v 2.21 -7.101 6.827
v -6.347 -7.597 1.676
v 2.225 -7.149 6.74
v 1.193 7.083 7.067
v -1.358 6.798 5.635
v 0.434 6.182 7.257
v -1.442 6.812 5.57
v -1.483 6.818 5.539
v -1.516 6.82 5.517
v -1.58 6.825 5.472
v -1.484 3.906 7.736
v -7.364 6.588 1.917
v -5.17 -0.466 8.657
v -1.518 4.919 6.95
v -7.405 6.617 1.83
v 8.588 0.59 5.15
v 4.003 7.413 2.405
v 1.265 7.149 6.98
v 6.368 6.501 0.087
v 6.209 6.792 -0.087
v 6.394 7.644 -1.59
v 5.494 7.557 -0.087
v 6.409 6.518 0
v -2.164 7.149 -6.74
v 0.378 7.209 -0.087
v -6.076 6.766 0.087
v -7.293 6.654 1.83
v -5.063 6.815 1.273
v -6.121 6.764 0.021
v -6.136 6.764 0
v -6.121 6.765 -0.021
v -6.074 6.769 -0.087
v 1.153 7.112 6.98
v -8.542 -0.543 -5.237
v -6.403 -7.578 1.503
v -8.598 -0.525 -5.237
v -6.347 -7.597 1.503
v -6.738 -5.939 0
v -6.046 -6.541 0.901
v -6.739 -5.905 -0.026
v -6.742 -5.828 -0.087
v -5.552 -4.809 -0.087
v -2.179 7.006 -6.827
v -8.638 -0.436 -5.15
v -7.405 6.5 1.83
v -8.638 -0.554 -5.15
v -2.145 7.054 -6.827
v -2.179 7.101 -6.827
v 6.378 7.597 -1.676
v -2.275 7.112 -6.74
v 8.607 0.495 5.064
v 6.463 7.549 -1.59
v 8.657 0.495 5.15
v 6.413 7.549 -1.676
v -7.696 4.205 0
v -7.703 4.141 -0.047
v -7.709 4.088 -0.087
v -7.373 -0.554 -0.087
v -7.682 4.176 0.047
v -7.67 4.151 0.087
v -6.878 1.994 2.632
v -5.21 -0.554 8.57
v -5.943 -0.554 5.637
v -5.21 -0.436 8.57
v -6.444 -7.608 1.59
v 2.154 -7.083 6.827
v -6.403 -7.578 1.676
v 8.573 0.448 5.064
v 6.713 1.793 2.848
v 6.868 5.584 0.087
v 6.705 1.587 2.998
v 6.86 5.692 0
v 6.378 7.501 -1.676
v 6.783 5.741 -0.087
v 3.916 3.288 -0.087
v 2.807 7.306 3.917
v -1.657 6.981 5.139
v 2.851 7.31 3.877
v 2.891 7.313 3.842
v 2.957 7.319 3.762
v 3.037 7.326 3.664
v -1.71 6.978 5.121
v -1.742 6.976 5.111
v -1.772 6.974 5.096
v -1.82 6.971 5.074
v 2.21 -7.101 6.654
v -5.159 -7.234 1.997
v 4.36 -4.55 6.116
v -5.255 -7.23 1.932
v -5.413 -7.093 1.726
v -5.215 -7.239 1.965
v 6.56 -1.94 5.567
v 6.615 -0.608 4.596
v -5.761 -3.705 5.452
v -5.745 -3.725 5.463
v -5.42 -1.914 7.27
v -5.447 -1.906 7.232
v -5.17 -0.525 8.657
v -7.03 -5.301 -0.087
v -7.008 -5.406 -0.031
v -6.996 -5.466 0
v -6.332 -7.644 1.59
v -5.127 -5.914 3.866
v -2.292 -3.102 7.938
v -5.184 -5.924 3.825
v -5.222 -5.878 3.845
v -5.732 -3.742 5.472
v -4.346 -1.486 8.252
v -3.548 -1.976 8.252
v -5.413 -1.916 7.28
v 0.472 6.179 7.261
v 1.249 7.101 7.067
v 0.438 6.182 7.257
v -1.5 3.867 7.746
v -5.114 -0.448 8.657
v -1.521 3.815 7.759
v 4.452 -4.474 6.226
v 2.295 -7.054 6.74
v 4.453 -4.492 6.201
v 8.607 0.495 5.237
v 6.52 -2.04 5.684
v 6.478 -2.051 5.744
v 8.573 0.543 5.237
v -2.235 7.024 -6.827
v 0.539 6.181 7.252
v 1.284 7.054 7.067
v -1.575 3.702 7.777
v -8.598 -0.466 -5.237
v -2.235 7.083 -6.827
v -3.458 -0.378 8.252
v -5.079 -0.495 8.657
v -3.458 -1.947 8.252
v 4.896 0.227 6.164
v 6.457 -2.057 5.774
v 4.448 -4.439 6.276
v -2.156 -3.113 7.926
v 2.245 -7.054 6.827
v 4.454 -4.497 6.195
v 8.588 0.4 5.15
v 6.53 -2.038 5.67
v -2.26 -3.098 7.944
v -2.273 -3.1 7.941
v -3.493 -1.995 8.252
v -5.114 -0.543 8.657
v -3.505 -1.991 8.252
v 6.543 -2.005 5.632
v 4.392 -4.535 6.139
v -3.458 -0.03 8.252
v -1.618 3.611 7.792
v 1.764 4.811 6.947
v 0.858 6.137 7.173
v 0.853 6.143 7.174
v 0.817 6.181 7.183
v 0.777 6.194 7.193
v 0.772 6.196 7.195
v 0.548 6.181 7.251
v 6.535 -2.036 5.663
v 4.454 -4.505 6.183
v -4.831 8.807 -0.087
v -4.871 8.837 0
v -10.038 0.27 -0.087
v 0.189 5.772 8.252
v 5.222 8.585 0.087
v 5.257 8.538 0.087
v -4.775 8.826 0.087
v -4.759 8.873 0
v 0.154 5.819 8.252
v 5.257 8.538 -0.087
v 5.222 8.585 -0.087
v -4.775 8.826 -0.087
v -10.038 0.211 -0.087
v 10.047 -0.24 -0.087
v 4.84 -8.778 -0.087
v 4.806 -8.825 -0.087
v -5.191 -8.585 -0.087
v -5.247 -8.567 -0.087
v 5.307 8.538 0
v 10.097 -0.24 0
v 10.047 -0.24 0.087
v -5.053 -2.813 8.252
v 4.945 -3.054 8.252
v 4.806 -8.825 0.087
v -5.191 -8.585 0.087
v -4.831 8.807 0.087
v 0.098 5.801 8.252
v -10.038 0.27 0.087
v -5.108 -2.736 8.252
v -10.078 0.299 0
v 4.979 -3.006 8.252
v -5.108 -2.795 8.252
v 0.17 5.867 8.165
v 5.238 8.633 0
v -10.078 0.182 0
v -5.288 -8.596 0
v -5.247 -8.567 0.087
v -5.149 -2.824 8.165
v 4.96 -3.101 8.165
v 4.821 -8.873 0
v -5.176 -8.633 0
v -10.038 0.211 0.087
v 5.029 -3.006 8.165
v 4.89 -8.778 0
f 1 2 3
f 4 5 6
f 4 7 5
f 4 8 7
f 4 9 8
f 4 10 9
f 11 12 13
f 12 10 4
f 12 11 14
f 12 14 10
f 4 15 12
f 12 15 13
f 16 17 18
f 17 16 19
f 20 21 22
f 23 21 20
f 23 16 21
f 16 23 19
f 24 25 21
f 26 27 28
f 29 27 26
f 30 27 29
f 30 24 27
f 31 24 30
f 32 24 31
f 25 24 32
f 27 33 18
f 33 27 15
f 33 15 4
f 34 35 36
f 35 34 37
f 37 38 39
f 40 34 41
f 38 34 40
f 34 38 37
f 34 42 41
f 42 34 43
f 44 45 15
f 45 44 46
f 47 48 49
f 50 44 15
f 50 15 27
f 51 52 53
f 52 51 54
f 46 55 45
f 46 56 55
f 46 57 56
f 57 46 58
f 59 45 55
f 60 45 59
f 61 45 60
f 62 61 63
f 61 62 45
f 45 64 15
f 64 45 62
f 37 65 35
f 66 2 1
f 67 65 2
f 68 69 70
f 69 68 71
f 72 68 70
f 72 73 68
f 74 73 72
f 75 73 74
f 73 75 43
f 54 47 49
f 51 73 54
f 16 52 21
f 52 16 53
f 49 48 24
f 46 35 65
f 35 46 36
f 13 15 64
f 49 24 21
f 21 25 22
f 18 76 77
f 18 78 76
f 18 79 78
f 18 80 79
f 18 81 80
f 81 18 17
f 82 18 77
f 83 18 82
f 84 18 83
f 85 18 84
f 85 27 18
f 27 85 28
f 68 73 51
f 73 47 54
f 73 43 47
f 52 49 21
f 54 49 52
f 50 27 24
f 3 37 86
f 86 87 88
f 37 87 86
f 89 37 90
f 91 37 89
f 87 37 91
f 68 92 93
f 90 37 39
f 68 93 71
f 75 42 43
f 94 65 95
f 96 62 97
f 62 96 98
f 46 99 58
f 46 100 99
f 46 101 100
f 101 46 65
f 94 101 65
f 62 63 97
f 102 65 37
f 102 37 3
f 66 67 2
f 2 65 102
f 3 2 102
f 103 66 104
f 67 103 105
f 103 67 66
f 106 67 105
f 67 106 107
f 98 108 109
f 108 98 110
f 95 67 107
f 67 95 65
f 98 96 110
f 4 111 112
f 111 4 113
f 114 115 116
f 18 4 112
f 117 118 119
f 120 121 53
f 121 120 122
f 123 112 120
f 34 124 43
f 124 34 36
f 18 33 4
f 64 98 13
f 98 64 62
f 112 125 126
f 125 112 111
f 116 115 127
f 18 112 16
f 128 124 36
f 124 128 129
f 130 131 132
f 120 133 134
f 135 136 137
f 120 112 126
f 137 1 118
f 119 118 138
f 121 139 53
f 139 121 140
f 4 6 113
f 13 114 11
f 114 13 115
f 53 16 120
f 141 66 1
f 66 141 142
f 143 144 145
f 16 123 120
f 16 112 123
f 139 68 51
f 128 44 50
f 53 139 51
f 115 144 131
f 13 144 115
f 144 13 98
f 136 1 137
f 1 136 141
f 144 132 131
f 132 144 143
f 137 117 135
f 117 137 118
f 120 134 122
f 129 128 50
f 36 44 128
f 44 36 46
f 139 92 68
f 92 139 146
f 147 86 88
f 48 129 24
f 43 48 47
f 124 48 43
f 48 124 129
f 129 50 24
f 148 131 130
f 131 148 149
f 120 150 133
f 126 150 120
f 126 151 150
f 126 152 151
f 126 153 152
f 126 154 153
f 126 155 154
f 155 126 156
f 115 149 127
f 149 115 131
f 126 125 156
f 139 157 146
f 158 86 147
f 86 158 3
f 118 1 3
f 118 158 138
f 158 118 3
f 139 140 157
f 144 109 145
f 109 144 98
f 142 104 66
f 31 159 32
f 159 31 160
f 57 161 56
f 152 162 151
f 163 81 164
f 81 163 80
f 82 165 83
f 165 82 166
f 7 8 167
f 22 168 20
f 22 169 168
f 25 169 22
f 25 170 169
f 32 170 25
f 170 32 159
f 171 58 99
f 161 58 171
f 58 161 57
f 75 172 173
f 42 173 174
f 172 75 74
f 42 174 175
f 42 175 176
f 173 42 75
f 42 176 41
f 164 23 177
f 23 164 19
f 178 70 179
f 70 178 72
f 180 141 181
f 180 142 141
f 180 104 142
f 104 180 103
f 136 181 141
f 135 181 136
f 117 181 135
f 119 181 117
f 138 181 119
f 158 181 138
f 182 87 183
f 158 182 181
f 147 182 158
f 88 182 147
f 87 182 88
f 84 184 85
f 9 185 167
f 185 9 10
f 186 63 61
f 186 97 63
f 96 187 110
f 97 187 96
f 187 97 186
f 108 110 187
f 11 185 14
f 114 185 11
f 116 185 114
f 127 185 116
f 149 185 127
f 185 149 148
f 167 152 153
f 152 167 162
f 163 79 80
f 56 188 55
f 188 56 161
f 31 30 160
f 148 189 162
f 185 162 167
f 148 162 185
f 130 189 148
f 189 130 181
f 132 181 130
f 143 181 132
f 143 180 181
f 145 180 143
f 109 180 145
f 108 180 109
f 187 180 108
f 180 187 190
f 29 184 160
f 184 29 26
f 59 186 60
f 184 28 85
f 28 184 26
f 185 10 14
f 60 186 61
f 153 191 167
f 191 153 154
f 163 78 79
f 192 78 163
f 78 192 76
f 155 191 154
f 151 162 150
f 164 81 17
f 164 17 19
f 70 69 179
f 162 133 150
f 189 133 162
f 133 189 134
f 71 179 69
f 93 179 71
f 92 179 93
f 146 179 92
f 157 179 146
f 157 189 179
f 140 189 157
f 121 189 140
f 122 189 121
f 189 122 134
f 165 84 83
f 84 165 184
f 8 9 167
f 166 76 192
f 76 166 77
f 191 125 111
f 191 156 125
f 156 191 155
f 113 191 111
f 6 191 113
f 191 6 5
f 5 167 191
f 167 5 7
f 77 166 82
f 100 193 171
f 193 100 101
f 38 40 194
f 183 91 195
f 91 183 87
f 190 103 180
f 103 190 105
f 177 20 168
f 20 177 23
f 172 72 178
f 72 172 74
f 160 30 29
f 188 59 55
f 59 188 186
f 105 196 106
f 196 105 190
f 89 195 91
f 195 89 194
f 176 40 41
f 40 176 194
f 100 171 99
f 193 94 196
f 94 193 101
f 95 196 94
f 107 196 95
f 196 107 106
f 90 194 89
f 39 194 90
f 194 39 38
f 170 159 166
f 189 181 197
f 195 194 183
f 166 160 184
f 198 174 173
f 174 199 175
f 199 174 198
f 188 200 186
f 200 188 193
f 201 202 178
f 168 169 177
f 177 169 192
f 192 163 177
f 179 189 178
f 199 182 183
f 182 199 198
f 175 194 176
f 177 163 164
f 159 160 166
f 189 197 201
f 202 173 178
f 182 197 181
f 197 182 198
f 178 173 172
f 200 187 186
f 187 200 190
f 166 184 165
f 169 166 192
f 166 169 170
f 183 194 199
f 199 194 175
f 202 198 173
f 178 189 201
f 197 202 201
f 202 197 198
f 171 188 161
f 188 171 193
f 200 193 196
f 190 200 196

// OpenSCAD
// Auto-generated OpenSCAD file

    inner_points = 10*[[-0.5067955693093701, -0.2765711460282869, 0.8164965809276397], [0.47903674428989906, -0.8777932204727784, 1.4395706848802092e-12], [-0.47903813632393366, 0.8777957186404731, -1.4395706848802092e-12], [0.4929154607816119, -0.3006097881369385, 0.8164965809284891], [-0.5206742858010829, -0.8537545783641267, 5.901945598907332e-13], [0.5206728937670484, 0.8537570765318214, -5.901945598907332e-13], [0.013878020474695501, 0.577184681419687, 0.8164965809270495], [0.9997103340739647, -0.024037393024804222, 8.493389008763497e-13], [-0.9997117261079992, 0.02403989119249895, -8.493389008763497e-13]];

    outer_points = 10*[[-0.512923269542972, -0.04952440908620236, 0.8570046980419713], [0.8557409845176946, 0.04952440908620236, 0.5150288344562363], [-0.8557409845176946, -0.04952440908620236, -0.5150288344562363], [0.12336155278650156, 0.7053703515917454, 0.6980219154077046], [0.21945616218822123, -0.7053703515917454, 0.674011617090503], [-0.21945616218822123, 0.7053703515917454, -0.674011617090503], [-0.7323794317311931, 0.6558459425055431, 0.1829930809514684], [0.6362848223294735, 0.7548947606779478, -0.15898278263426666], [-0.6362848223294735, -0.7548947606779478, 0.15898278263426666]];

    // Convex hull for inner set (I)
    module inner_hull() {
        hull() {
            for (p = inner_points) {
                translate(p) sphere(r=0.1);
            }
        }
    }

    // Convex hull for outer set (O) minus inner hull (O \ I)
    module outer_minus_inner() {
        difference() {
            hull() {
                for (p = outer_points) {
                    translate(p) sphere(r=0.1);
                }
            }
            inner_hull(); // Subtract inner hull
        }
    }

    // Convex hull for outer set (O) minus all translated inner hulls
    module outer_minus_AllTranslationInner() {
        difference() {
            hull() {
                for (p = outer_points) {
                    translate(p) sphere(r=0.1);
                }
            }
            hull() {
                translate([0,0,50]) inner_hull();
                translate([0,0,-50]) inner_hull();
            }; // Subtract translated inner hulls
        }
    }

    // Difference between outer_minus_inner and outer_minus_AllTranslationInner
    module outer_minus_inner_diff() {
        difference() {
            // Outer minus inner
            difference() {
                hull() {
                    for (p = outer_points) {
                        translate(p) sphere(r=0.1);
                    }
                }
                inner_hull();
            }

            // Subtract Outer minus AllTranslationInner
            difference() {
                hull() {
                    for (p = outer_points) {
                        translate(p) sphere(r=0.1);
                    }
                }
                hull() {
                    translate([0,0,50]) inner_hull();
                    translate([0,0,-50]) inner_hull();
                };
            }
        }
    }

    // Rendering all with colors applied
    color([1, 0, 0, 0.5]) inner_hull(); // Transparent red
    color([0, 1, 0, 1]) outer_minus_AllTranslationInner(); // Opaque green
    color([1, 1, 0, 1]) outer_minus_inner_diff(); // Opaque yellow
    
